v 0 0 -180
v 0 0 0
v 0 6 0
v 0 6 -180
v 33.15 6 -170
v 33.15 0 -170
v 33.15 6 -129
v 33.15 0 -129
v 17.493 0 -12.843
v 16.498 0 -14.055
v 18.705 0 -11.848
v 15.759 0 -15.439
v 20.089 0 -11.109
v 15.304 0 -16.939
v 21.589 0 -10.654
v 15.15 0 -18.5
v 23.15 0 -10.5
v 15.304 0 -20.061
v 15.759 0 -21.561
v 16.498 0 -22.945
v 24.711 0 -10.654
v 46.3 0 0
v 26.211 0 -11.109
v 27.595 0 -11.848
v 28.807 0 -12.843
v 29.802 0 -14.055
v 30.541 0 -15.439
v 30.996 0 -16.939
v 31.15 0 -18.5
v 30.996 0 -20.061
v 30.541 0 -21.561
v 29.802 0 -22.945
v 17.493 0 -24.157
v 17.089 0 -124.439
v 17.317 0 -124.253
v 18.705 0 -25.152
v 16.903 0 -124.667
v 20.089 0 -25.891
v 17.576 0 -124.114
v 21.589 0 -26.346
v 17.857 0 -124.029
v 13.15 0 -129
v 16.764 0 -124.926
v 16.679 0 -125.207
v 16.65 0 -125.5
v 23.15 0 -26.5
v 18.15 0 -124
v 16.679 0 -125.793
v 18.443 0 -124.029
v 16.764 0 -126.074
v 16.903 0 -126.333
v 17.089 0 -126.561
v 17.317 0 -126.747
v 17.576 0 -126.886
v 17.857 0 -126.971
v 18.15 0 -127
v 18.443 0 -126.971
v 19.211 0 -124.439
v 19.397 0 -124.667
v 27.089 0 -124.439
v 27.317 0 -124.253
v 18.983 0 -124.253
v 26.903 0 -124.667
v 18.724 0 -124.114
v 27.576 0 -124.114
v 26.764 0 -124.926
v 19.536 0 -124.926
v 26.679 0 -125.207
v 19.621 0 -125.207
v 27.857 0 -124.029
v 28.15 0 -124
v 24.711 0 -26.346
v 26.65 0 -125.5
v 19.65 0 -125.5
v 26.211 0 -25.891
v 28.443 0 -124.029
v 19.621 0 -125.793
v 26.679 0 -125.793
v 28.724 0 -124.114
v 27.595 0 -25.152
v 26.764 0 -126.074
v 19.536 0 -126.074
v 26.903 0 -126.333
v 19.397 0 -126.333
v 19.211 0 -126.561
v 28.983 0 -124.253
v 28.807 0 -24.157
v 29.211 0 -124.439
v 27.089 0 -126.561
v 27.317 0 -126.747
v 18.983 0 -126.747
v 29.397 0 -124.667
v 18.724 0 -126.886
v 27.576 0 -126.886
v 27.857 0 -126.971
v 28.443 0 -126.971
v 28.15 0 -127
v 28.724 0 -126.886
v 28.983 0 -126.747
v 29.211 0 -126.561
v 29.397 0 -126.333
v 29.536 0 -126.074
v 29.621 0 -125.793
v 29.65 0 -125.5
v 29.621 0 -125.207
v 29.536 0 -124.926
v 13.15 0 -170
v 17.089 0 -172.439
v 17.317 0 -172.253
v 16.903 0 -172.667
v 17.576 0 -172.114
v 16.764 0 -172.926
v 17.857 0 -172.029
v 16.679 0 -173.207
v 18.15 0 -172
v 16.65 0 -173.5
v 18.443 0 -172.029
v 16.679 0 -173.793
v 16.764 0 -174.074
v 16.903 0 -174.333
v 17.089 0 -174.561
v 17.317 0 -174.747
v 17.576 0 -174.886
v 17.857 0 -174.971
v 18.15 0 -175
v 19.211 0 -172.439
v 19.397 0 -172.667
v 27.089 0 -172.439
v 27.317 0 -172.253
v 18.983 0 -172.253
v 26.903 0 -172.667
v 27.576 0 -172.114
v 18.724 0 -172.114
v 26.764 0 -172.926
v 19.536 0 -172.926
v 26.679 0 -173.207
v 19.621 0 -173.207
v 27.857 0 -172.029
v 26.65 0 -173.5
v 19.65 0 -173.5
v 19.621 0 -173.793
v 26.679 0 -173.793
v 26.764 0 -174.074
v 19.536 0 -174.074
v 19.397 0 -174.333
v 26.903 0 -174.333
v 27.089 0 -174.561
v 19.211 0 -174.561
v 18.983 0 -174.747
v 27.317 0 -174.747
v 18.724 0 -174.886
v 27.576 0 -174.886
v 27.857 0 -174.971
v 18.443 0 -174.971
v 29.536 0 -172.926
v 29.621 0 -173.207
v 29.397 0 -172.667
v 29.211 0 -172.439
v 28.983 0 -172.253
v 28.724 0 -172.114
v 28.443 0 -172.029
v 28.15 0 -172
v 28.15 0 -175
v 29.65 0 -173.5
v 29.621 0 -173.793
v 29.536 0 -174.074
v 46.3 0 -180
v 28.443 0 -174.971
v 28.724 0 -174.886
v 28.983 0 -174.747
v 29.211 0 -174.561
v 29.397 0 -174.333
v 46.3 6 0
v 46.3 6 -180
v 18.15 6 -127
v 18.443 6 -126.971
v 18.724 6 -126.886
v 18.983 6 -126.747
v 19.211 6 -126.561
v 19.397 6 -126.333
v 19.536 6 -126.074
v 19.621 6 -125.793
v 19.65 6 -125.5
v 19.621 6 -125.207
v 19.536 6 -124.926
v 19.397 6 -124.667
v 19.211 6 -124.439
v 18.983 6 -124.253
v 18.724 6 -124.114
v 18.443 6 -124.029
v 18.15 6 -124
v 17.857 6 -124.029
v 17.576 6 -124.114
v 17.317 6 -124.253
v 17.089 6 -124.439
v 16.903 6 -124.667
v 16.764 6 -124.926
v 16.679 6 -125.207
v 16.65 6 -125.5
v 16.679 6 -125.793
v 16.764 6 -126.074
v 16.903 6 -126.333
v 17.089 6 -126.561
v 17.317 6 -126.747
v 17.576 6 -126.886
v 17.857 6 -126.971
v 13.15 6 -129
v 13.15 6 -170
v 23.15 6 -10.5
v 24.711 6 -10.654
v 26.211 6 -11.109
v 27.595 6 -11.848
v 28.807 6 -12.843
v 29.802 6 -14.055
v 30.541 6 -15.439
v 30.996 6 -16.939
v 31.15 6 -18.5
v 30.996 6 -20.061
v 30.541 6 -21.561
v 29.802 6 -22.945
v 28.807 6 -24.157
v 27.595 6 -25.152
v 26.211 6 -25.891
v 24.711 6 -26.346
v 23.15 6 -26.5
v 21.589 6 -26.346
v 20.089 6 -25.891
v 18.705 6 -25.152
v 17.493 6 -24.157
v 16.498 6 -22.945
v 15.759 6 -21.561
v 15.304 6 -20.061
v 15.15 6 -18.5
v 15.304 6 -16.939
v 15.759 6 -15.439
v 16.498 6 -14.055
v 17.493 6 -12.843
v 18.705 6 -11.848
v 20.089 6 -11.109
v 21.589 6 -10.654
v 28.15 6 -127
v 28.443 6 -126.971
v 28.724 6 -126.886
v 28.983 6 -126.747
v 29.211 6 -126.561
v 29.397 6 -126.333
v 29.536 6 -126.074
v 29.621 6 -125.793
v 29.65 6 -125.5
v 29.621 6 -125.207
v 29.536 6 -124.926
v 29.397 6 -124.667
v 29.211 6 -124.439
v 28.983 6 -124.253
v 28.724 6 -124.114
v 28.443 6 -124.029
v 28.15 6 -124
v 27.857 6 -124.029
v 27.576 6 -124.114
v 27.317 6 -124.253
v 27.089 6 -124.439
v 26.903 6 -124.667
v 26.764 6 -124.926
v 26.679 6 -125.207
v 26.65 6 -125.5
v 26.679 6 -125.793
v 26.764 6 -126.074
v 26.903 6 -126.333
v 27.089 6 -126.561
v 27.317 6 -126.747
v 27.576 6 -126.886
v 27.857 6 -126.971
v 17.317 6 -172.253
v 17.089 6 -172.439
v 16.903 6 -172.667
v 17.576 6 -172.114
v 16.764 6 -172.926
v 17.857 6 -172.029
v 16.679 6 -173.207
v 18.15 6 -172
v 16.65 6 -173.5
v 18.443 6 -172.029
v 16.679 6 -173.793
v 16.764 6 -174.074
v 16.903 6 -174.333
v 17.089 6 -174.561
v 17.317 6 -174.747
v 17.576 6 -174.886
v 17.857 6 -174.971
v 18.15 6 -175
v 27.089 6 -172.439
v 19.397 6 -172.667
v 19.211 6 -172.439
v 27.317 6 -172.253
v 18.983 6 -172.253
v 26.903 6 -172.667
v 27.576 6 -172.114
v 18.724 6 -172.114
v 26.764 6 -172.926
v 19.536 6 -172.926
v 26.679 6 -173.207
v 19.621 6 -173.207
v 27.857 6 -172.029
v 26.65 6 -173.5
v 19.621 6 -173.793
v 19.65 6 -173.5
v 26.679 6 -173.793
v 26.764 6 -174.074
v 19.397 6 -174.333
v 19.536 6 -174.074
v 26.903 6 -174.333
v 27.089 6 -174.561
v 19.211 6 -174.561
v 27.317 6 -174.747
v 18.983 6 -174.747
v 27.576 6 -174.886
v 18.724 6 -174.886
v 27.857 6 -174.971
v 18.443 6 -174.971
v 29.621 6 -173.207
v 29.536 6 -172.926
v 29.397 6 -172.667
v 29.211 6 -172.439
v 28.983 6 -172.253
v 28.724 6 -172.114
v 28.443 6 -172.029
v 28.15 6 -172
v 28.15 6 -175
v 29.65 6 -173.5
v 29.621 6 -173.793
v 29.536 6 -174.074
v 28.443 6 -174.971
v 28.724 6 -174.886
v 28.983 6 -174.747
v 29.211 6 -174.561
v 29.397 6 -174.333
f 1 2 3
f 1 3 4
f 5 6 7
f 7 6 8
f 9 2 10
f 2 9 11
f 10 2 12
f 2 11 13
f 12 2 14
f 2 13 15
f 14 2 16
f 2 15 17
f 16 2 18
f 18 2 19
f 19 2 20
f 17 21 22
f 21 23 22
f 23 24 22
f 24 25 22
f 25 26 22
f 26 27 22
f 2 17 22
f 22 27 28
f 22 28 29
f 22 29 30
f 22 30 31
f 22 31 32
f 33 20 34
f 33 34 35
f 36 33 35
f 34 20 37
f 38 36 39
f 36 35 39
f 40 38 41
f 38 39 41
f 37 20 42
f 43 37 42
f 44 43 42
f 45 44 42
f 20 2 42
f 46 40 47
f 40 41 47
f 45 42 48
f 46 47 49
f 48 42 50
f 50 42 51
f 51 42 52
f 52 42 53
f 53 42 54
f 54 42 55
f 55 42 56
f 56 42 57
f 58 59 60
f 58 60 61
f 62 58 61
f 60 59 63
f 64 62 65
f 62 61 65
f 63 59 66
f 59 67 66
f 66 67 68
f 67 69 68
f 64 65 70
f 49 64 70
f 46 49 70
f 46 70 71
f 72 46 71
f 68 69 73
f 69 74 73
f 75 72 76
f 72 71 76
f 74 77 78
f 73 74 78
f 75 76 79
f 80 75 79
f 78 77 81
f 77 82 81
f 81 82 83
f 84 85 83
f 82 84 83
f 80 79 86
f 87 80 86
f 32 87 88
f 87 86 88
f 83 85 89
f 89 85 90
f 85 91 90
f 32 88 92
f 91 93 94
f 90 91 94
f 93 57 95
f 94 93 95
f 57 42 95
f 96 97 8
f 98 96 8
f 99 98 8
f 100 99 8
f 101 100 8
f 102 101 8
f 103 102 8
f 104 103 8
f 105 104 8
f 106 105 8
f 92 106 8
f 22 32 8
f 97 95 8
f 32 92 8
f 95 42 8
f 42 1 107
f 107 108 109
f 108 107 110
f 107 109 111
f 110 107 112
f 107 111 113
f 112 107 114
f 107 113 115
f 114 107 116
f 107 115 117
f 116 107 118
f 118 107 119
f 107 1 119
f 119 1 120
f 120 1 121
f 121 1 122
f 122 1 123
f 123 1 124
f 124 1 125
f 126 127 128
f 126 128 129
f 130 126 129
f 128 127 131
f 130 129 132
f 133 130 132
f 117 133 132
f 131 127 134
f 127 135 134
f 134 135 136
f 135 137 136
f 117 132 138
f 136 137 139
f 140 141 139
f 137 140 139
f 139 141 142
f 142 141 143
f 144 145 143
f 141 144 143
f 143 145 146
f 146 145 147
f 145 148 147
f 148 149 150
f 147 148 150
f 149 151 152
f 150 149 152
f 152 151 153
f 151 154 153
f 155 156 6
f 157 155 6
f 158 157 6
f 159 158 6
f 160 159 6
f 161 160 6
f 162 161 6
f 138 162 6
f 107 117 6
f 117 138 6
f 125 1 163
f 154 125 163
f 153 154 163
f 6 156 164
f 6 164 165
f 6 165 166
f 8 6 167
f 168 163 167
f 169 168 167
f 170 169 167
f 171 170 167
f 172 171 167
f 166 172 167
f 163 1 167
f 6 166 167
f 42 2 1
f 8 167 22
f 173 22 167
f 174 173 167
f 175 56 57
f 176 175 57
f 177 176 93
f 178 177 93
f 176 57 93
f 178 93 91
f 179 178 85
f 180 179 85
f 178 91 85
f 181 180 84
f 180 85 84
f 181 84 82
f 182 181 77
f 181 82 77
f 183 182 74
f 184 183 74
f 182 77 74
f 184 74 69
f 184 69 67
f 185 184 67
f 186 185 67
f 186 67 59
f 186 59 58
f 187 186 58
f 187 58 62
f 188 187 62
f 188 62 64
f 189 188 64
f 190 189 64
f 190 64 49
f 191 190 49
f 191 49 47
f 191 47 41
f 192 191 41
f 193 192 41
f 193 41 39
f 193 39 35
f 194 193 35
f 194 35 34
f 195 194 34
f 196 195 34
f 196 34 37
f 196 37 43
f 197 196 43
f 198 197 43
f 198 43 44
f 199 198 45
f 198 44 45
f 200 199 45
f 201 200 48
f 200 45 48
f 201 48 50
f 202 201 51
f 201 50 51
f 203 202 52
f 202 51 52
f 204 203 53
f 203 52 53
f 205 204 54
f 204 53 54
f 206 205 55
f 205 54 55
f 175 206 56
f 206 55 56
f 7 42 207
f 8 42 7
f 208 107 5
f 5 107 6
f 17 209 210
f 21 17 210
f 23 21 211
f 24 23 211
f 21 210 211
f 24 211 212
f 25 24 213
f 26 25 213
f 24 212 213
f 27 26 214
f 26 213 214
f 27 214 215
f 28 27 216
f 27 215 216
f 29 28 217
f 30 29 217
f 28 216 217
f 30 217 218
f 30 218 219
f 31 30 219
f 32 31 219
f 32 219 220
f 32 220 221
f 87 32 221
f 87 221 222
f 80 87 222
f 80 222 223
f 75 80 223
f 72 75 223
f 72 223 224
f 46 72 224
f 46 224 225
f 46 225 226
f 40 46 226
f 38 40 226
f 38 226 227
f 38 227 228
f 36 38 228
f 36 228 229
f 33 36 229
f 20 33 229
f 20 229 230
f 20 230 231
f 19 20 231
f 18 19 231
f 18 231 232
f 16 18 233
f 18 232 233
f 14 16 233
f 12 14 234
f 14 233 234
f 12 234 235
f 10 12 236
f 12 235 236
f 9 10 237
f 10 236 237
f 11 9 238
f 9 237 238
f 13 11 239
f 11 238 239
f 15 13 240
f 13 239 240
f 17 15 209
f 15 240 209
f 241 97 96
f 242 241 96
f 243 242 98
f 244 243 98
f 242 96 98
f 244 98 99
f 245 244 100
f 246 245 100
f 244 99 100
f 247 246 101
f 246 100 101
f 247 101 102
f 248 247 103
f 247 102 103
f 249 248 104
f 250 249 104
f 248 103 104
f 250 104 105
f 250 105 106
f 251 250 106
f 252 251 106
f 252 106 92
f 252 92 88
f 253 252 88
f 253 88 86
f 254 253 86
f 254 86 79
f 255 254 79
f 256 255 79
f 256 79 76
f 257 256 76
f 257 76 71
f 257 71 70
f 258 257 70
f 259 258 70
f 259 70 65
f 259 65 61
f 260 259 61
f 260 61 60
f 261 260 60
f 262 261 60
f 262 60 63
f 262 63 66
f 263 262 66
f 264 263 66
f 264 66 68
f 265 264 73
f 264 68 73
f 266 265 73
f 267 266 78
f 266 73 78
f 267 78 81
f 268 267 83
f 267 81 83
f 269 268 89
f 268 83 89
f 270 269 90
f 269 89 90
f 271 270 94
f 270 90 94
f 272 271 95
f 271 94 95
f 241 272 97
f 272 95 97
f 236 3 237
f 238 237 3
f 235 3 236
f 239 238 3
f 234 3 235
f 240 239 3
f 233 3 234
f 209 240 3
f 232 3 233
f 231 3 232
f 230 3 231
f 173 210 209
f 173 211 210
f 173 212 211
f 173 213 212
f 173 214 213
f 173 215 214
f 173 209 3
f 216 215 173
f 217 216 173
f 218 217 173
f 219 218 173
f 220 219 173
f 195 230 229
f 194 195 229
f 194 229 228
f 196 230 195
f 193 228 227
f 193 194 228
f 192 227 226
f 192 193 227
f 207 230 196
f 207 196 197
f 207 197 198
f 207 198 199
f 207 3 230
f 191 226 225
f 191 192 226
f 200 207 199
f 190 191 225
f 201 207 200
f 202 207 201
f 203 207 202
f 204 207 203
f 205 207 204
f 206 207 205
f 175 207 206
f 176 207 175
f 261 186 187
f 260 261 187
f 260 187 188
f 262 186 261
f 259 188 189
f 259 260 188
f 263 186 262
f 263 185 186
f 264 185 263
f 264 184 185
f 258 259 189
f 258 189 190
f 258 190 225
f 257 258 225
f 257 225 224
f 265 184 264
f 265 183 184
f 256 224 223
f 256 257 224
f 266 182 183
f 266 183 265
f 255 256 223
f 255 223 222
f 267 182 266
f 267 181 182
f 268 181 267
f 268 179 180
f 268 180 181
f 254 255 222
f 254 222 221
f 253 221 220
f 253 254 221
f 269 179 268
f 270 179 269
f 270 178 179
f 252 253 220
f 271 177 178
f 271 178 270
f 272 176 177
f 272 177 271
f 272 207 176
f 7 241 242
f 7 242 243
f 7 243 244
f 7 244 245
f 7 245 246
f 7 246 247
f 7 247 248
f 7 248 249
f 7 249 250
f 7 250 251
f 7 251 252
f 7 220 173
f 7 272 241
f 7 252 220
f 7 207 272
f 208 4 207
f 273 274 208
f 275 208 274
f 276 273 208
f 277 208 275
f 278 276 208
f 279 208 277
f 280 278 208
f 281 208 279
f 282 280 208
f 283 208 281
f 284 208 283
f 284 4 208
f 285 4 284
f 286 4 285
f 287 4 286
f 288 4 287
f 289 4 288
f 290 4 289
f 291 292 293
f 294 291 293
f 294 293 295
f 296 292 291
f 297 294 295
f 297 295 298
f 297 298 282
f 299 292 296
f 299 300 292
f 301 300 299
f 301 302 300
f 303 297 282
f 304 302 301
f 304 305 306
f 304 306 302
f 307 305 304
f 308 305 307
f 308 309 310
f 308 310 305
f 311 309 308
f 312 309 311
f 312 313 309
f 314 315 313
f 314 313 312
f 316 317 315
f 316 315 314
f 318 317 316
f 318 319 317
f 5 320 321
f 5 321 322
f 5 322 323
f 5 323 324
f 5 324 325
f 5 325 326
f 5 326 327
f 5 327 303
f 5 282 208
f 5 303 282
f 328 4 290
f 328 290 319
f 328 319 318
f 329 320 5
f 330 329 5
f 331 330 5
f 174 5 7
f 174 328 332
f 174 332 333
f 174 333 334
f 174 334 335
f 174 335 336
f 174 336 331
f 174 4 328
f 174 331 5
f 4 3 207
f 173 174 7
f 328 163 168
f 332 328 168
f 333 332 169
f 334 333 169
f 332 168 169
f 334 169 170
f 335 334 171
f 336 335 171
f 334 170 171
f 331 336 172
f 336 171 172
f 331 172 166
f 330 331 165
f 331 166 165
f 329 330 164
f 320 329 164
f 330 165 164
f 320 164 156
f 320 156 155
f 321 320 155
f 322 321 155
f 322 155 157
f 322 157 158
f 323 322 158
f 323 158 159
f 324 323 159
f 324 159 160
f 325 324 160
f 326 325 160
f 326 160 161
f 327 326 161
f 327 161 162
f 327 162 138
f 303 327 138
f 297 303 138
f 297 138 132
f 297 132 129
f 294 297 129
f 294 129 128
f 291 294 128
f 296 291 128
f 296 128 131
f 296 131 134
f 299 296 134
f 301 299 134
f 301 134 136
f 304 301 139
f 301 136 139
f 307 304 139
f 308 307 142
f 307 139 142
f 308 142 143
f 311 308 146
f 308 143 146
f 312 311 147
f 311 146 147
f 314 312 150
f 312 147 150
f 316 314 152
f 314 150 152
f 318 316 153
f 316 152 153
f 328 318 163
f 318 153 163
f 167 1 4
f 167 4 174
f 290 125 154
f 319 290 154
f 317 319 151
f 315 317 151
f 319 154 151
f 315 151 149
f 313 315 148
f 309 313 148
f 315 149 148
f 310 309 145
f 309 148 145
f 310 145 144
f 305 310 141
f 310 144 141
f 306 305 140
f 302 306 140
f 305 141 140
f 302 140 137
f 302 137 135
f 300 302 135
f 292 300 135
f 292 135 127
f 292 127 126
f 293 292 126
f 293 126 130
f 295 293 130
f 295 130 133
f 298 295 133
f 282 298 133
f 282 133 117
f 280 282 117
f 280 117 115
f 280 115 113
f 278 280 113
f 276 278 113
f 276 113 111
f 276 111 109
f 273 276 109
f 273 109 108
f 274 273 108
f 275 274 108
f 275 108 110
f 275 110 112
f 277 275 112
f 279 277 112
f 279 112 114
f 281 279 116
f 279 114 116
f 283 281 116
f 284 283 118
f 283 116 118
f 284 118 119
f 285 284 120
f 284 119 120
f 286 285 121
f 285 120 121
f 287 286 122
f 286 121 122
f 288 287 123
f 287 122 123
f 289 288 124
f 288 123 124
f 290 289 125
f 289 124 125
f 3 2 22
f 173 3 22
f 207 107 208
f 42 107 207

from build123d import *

# Parameters (mm, degrees)
SKETCH1_W           = 46.3
SKETCH1_H           = 180
BOSS_EXTRUDE1_DEPTH = 6
CUT_EXTRUDE1_REACH  = 187.956
SKETCH2_R           = 8
CUT_EXTRUDE2_REACH  = 187.956
SKETCH4_R           = 1.5
SKETCH4_W           = 20
SKETCH4_H           = 41


with BuildPart() as part:
    # Sketch1 → Boss-Extrude1 (new body)
    with BuildSketch(Plane(origin=(0, 0, 0), x_dir=(1, 0, 0), z_dir=(0, 1, 0))):
        with Locations((23.15, 90)):
            Rectangle(SKETCH1_W, SKETCH1_H)
    extrude(amount=BOSS_EXTRUDE1_DEPTH)

    # Sketch2 → Cut-Extrude1 (cut, up to next)
    with BuildSketch(Plane(origin=(0, 6, 0), x_dir=(1, 0, 0), z_dir=(0, 1, 0)), mode=Mode.PRIVATE) as cut_extrude1_sk1:
        with Locations(Location((23.15, 18.5, 0), (0, 0, 270))):
            Circle(SKETCH2_R)
    cut_extrude1_tool1 = extrude(cut_extrude1_sk1.sketch, amount=-CUT_EXTRUDE1_REACH, mode=Mode.PRIVATE) & part.part
    add(cut_extrude1_tool1.solids().sort_by_distance((23.15, 6, -18.5))[0], mode=Mode.SUBTRACT)

    # Sketch4 → Cut-Extrude2 (cut, up to next)
    with BuildSketch(Plane.XZ, mode=Mode.PRIVATE) as cut_extrude2_sk1:
        with Locations(Location((28.15, -173.5, 0), (0, 0, 270))):
            Circle(SKETCH4_R)
    cut_extrude2_tool1 = extrude(cut_extrude2_sk1.sketch, amount=-CUT_EXTRUDE2_REACH, mode=Mode.PRIVATE) & part.part
    # Sketch4 → Cut-Extrude2 (cut, up to next)
    with BuildSketch(Plane.XZ, mode=Mode.PRIVATE) as cut_extrude2_sk2:
        with Locations(Location((18.15, -173.5, 0), (0, 0, 270))):
            Circle(SKETCH4_R)
    cut_extrude2_tool2 = extrude(cut_extrude2_sk2.sketch, amount=-CUT_EXTRUDE2_REACH, mode=Mode.PRIVATE) & part.part
    # Sketch4 → Cut-Extrude2 (cut, up to next)
    with BuildSketch(Plane.XZ, mode=Mode.PRIVATE) as cut_extrude2_sk3:
        with Locations(Location((18.15, -125.5, 0), (0, 0, 270))):
            Circle(SKETCH4_R)
    cut_extrude2_tool3 = extrude(cut_extrude2_sk3.sketch, amount=-CUT_EXTRUDE2_REACH, mode=Mode.PRIVATE) & part.part
    # Sketch4 → Cut-Extrude2 (cut, up to next)
    with BuildSketch(Plane.XZ, mode=Mode.PRIVATE) as cut_extrude2_sk4:
        with Locations(Location((28.15, -125.5, 0), (0, 0, 270))):
            Circle(SKETCH4_R)
    cut_extrude2_tool4 = extrude(cut_extrude2_sk4.sketch, amount=-CUT_EXTRUDE2_REACH, mode=Mode.PRIVATE) & part.part
    # Sketch4 → Cut-Extrude2 (cut, up to next)
    with BuildSketch(Plane.XZ, mode=Mode.PRIVATE) as cut_extrude2_sk5:
        with Locations((23.15, -149.5)):
            Rectangle(SKETCH4_W, SKETCH4_H)
    cut_extrude2_tool5 = extrude(cut_extrude2_sk5.sketch, amount=-CUT_EXTRUDE2_REACH, mode=Mode.PRIVATE) & part.part
    add(cut_extrude2_tool1.solids().sort_by_distance((28.15, 0, -173.5))[0], mode=Mode.SUBTRACT)
    add(cut_extrude2_tool2.solids().sort_by_distance((18.15, 0, -173.5))[0], mode=Mode.SUBTRACT)
    add(cut_extrude2_tool3.solids().sort_by_distance((18.15, 0, -125.5))[0], mode=Mode.SUBTRACT)
    add(cut_extrude2_tool4.solids().sort_by_distance((28.15, 0, -125.5))[0], mode=Mode.SUBTRACT)
    add(cut_extrude2_tool5.solids().sort_by_distance((23.15, 0, -149.5))[0], mode=Mode.SUBTRACT)


solid = part.part
